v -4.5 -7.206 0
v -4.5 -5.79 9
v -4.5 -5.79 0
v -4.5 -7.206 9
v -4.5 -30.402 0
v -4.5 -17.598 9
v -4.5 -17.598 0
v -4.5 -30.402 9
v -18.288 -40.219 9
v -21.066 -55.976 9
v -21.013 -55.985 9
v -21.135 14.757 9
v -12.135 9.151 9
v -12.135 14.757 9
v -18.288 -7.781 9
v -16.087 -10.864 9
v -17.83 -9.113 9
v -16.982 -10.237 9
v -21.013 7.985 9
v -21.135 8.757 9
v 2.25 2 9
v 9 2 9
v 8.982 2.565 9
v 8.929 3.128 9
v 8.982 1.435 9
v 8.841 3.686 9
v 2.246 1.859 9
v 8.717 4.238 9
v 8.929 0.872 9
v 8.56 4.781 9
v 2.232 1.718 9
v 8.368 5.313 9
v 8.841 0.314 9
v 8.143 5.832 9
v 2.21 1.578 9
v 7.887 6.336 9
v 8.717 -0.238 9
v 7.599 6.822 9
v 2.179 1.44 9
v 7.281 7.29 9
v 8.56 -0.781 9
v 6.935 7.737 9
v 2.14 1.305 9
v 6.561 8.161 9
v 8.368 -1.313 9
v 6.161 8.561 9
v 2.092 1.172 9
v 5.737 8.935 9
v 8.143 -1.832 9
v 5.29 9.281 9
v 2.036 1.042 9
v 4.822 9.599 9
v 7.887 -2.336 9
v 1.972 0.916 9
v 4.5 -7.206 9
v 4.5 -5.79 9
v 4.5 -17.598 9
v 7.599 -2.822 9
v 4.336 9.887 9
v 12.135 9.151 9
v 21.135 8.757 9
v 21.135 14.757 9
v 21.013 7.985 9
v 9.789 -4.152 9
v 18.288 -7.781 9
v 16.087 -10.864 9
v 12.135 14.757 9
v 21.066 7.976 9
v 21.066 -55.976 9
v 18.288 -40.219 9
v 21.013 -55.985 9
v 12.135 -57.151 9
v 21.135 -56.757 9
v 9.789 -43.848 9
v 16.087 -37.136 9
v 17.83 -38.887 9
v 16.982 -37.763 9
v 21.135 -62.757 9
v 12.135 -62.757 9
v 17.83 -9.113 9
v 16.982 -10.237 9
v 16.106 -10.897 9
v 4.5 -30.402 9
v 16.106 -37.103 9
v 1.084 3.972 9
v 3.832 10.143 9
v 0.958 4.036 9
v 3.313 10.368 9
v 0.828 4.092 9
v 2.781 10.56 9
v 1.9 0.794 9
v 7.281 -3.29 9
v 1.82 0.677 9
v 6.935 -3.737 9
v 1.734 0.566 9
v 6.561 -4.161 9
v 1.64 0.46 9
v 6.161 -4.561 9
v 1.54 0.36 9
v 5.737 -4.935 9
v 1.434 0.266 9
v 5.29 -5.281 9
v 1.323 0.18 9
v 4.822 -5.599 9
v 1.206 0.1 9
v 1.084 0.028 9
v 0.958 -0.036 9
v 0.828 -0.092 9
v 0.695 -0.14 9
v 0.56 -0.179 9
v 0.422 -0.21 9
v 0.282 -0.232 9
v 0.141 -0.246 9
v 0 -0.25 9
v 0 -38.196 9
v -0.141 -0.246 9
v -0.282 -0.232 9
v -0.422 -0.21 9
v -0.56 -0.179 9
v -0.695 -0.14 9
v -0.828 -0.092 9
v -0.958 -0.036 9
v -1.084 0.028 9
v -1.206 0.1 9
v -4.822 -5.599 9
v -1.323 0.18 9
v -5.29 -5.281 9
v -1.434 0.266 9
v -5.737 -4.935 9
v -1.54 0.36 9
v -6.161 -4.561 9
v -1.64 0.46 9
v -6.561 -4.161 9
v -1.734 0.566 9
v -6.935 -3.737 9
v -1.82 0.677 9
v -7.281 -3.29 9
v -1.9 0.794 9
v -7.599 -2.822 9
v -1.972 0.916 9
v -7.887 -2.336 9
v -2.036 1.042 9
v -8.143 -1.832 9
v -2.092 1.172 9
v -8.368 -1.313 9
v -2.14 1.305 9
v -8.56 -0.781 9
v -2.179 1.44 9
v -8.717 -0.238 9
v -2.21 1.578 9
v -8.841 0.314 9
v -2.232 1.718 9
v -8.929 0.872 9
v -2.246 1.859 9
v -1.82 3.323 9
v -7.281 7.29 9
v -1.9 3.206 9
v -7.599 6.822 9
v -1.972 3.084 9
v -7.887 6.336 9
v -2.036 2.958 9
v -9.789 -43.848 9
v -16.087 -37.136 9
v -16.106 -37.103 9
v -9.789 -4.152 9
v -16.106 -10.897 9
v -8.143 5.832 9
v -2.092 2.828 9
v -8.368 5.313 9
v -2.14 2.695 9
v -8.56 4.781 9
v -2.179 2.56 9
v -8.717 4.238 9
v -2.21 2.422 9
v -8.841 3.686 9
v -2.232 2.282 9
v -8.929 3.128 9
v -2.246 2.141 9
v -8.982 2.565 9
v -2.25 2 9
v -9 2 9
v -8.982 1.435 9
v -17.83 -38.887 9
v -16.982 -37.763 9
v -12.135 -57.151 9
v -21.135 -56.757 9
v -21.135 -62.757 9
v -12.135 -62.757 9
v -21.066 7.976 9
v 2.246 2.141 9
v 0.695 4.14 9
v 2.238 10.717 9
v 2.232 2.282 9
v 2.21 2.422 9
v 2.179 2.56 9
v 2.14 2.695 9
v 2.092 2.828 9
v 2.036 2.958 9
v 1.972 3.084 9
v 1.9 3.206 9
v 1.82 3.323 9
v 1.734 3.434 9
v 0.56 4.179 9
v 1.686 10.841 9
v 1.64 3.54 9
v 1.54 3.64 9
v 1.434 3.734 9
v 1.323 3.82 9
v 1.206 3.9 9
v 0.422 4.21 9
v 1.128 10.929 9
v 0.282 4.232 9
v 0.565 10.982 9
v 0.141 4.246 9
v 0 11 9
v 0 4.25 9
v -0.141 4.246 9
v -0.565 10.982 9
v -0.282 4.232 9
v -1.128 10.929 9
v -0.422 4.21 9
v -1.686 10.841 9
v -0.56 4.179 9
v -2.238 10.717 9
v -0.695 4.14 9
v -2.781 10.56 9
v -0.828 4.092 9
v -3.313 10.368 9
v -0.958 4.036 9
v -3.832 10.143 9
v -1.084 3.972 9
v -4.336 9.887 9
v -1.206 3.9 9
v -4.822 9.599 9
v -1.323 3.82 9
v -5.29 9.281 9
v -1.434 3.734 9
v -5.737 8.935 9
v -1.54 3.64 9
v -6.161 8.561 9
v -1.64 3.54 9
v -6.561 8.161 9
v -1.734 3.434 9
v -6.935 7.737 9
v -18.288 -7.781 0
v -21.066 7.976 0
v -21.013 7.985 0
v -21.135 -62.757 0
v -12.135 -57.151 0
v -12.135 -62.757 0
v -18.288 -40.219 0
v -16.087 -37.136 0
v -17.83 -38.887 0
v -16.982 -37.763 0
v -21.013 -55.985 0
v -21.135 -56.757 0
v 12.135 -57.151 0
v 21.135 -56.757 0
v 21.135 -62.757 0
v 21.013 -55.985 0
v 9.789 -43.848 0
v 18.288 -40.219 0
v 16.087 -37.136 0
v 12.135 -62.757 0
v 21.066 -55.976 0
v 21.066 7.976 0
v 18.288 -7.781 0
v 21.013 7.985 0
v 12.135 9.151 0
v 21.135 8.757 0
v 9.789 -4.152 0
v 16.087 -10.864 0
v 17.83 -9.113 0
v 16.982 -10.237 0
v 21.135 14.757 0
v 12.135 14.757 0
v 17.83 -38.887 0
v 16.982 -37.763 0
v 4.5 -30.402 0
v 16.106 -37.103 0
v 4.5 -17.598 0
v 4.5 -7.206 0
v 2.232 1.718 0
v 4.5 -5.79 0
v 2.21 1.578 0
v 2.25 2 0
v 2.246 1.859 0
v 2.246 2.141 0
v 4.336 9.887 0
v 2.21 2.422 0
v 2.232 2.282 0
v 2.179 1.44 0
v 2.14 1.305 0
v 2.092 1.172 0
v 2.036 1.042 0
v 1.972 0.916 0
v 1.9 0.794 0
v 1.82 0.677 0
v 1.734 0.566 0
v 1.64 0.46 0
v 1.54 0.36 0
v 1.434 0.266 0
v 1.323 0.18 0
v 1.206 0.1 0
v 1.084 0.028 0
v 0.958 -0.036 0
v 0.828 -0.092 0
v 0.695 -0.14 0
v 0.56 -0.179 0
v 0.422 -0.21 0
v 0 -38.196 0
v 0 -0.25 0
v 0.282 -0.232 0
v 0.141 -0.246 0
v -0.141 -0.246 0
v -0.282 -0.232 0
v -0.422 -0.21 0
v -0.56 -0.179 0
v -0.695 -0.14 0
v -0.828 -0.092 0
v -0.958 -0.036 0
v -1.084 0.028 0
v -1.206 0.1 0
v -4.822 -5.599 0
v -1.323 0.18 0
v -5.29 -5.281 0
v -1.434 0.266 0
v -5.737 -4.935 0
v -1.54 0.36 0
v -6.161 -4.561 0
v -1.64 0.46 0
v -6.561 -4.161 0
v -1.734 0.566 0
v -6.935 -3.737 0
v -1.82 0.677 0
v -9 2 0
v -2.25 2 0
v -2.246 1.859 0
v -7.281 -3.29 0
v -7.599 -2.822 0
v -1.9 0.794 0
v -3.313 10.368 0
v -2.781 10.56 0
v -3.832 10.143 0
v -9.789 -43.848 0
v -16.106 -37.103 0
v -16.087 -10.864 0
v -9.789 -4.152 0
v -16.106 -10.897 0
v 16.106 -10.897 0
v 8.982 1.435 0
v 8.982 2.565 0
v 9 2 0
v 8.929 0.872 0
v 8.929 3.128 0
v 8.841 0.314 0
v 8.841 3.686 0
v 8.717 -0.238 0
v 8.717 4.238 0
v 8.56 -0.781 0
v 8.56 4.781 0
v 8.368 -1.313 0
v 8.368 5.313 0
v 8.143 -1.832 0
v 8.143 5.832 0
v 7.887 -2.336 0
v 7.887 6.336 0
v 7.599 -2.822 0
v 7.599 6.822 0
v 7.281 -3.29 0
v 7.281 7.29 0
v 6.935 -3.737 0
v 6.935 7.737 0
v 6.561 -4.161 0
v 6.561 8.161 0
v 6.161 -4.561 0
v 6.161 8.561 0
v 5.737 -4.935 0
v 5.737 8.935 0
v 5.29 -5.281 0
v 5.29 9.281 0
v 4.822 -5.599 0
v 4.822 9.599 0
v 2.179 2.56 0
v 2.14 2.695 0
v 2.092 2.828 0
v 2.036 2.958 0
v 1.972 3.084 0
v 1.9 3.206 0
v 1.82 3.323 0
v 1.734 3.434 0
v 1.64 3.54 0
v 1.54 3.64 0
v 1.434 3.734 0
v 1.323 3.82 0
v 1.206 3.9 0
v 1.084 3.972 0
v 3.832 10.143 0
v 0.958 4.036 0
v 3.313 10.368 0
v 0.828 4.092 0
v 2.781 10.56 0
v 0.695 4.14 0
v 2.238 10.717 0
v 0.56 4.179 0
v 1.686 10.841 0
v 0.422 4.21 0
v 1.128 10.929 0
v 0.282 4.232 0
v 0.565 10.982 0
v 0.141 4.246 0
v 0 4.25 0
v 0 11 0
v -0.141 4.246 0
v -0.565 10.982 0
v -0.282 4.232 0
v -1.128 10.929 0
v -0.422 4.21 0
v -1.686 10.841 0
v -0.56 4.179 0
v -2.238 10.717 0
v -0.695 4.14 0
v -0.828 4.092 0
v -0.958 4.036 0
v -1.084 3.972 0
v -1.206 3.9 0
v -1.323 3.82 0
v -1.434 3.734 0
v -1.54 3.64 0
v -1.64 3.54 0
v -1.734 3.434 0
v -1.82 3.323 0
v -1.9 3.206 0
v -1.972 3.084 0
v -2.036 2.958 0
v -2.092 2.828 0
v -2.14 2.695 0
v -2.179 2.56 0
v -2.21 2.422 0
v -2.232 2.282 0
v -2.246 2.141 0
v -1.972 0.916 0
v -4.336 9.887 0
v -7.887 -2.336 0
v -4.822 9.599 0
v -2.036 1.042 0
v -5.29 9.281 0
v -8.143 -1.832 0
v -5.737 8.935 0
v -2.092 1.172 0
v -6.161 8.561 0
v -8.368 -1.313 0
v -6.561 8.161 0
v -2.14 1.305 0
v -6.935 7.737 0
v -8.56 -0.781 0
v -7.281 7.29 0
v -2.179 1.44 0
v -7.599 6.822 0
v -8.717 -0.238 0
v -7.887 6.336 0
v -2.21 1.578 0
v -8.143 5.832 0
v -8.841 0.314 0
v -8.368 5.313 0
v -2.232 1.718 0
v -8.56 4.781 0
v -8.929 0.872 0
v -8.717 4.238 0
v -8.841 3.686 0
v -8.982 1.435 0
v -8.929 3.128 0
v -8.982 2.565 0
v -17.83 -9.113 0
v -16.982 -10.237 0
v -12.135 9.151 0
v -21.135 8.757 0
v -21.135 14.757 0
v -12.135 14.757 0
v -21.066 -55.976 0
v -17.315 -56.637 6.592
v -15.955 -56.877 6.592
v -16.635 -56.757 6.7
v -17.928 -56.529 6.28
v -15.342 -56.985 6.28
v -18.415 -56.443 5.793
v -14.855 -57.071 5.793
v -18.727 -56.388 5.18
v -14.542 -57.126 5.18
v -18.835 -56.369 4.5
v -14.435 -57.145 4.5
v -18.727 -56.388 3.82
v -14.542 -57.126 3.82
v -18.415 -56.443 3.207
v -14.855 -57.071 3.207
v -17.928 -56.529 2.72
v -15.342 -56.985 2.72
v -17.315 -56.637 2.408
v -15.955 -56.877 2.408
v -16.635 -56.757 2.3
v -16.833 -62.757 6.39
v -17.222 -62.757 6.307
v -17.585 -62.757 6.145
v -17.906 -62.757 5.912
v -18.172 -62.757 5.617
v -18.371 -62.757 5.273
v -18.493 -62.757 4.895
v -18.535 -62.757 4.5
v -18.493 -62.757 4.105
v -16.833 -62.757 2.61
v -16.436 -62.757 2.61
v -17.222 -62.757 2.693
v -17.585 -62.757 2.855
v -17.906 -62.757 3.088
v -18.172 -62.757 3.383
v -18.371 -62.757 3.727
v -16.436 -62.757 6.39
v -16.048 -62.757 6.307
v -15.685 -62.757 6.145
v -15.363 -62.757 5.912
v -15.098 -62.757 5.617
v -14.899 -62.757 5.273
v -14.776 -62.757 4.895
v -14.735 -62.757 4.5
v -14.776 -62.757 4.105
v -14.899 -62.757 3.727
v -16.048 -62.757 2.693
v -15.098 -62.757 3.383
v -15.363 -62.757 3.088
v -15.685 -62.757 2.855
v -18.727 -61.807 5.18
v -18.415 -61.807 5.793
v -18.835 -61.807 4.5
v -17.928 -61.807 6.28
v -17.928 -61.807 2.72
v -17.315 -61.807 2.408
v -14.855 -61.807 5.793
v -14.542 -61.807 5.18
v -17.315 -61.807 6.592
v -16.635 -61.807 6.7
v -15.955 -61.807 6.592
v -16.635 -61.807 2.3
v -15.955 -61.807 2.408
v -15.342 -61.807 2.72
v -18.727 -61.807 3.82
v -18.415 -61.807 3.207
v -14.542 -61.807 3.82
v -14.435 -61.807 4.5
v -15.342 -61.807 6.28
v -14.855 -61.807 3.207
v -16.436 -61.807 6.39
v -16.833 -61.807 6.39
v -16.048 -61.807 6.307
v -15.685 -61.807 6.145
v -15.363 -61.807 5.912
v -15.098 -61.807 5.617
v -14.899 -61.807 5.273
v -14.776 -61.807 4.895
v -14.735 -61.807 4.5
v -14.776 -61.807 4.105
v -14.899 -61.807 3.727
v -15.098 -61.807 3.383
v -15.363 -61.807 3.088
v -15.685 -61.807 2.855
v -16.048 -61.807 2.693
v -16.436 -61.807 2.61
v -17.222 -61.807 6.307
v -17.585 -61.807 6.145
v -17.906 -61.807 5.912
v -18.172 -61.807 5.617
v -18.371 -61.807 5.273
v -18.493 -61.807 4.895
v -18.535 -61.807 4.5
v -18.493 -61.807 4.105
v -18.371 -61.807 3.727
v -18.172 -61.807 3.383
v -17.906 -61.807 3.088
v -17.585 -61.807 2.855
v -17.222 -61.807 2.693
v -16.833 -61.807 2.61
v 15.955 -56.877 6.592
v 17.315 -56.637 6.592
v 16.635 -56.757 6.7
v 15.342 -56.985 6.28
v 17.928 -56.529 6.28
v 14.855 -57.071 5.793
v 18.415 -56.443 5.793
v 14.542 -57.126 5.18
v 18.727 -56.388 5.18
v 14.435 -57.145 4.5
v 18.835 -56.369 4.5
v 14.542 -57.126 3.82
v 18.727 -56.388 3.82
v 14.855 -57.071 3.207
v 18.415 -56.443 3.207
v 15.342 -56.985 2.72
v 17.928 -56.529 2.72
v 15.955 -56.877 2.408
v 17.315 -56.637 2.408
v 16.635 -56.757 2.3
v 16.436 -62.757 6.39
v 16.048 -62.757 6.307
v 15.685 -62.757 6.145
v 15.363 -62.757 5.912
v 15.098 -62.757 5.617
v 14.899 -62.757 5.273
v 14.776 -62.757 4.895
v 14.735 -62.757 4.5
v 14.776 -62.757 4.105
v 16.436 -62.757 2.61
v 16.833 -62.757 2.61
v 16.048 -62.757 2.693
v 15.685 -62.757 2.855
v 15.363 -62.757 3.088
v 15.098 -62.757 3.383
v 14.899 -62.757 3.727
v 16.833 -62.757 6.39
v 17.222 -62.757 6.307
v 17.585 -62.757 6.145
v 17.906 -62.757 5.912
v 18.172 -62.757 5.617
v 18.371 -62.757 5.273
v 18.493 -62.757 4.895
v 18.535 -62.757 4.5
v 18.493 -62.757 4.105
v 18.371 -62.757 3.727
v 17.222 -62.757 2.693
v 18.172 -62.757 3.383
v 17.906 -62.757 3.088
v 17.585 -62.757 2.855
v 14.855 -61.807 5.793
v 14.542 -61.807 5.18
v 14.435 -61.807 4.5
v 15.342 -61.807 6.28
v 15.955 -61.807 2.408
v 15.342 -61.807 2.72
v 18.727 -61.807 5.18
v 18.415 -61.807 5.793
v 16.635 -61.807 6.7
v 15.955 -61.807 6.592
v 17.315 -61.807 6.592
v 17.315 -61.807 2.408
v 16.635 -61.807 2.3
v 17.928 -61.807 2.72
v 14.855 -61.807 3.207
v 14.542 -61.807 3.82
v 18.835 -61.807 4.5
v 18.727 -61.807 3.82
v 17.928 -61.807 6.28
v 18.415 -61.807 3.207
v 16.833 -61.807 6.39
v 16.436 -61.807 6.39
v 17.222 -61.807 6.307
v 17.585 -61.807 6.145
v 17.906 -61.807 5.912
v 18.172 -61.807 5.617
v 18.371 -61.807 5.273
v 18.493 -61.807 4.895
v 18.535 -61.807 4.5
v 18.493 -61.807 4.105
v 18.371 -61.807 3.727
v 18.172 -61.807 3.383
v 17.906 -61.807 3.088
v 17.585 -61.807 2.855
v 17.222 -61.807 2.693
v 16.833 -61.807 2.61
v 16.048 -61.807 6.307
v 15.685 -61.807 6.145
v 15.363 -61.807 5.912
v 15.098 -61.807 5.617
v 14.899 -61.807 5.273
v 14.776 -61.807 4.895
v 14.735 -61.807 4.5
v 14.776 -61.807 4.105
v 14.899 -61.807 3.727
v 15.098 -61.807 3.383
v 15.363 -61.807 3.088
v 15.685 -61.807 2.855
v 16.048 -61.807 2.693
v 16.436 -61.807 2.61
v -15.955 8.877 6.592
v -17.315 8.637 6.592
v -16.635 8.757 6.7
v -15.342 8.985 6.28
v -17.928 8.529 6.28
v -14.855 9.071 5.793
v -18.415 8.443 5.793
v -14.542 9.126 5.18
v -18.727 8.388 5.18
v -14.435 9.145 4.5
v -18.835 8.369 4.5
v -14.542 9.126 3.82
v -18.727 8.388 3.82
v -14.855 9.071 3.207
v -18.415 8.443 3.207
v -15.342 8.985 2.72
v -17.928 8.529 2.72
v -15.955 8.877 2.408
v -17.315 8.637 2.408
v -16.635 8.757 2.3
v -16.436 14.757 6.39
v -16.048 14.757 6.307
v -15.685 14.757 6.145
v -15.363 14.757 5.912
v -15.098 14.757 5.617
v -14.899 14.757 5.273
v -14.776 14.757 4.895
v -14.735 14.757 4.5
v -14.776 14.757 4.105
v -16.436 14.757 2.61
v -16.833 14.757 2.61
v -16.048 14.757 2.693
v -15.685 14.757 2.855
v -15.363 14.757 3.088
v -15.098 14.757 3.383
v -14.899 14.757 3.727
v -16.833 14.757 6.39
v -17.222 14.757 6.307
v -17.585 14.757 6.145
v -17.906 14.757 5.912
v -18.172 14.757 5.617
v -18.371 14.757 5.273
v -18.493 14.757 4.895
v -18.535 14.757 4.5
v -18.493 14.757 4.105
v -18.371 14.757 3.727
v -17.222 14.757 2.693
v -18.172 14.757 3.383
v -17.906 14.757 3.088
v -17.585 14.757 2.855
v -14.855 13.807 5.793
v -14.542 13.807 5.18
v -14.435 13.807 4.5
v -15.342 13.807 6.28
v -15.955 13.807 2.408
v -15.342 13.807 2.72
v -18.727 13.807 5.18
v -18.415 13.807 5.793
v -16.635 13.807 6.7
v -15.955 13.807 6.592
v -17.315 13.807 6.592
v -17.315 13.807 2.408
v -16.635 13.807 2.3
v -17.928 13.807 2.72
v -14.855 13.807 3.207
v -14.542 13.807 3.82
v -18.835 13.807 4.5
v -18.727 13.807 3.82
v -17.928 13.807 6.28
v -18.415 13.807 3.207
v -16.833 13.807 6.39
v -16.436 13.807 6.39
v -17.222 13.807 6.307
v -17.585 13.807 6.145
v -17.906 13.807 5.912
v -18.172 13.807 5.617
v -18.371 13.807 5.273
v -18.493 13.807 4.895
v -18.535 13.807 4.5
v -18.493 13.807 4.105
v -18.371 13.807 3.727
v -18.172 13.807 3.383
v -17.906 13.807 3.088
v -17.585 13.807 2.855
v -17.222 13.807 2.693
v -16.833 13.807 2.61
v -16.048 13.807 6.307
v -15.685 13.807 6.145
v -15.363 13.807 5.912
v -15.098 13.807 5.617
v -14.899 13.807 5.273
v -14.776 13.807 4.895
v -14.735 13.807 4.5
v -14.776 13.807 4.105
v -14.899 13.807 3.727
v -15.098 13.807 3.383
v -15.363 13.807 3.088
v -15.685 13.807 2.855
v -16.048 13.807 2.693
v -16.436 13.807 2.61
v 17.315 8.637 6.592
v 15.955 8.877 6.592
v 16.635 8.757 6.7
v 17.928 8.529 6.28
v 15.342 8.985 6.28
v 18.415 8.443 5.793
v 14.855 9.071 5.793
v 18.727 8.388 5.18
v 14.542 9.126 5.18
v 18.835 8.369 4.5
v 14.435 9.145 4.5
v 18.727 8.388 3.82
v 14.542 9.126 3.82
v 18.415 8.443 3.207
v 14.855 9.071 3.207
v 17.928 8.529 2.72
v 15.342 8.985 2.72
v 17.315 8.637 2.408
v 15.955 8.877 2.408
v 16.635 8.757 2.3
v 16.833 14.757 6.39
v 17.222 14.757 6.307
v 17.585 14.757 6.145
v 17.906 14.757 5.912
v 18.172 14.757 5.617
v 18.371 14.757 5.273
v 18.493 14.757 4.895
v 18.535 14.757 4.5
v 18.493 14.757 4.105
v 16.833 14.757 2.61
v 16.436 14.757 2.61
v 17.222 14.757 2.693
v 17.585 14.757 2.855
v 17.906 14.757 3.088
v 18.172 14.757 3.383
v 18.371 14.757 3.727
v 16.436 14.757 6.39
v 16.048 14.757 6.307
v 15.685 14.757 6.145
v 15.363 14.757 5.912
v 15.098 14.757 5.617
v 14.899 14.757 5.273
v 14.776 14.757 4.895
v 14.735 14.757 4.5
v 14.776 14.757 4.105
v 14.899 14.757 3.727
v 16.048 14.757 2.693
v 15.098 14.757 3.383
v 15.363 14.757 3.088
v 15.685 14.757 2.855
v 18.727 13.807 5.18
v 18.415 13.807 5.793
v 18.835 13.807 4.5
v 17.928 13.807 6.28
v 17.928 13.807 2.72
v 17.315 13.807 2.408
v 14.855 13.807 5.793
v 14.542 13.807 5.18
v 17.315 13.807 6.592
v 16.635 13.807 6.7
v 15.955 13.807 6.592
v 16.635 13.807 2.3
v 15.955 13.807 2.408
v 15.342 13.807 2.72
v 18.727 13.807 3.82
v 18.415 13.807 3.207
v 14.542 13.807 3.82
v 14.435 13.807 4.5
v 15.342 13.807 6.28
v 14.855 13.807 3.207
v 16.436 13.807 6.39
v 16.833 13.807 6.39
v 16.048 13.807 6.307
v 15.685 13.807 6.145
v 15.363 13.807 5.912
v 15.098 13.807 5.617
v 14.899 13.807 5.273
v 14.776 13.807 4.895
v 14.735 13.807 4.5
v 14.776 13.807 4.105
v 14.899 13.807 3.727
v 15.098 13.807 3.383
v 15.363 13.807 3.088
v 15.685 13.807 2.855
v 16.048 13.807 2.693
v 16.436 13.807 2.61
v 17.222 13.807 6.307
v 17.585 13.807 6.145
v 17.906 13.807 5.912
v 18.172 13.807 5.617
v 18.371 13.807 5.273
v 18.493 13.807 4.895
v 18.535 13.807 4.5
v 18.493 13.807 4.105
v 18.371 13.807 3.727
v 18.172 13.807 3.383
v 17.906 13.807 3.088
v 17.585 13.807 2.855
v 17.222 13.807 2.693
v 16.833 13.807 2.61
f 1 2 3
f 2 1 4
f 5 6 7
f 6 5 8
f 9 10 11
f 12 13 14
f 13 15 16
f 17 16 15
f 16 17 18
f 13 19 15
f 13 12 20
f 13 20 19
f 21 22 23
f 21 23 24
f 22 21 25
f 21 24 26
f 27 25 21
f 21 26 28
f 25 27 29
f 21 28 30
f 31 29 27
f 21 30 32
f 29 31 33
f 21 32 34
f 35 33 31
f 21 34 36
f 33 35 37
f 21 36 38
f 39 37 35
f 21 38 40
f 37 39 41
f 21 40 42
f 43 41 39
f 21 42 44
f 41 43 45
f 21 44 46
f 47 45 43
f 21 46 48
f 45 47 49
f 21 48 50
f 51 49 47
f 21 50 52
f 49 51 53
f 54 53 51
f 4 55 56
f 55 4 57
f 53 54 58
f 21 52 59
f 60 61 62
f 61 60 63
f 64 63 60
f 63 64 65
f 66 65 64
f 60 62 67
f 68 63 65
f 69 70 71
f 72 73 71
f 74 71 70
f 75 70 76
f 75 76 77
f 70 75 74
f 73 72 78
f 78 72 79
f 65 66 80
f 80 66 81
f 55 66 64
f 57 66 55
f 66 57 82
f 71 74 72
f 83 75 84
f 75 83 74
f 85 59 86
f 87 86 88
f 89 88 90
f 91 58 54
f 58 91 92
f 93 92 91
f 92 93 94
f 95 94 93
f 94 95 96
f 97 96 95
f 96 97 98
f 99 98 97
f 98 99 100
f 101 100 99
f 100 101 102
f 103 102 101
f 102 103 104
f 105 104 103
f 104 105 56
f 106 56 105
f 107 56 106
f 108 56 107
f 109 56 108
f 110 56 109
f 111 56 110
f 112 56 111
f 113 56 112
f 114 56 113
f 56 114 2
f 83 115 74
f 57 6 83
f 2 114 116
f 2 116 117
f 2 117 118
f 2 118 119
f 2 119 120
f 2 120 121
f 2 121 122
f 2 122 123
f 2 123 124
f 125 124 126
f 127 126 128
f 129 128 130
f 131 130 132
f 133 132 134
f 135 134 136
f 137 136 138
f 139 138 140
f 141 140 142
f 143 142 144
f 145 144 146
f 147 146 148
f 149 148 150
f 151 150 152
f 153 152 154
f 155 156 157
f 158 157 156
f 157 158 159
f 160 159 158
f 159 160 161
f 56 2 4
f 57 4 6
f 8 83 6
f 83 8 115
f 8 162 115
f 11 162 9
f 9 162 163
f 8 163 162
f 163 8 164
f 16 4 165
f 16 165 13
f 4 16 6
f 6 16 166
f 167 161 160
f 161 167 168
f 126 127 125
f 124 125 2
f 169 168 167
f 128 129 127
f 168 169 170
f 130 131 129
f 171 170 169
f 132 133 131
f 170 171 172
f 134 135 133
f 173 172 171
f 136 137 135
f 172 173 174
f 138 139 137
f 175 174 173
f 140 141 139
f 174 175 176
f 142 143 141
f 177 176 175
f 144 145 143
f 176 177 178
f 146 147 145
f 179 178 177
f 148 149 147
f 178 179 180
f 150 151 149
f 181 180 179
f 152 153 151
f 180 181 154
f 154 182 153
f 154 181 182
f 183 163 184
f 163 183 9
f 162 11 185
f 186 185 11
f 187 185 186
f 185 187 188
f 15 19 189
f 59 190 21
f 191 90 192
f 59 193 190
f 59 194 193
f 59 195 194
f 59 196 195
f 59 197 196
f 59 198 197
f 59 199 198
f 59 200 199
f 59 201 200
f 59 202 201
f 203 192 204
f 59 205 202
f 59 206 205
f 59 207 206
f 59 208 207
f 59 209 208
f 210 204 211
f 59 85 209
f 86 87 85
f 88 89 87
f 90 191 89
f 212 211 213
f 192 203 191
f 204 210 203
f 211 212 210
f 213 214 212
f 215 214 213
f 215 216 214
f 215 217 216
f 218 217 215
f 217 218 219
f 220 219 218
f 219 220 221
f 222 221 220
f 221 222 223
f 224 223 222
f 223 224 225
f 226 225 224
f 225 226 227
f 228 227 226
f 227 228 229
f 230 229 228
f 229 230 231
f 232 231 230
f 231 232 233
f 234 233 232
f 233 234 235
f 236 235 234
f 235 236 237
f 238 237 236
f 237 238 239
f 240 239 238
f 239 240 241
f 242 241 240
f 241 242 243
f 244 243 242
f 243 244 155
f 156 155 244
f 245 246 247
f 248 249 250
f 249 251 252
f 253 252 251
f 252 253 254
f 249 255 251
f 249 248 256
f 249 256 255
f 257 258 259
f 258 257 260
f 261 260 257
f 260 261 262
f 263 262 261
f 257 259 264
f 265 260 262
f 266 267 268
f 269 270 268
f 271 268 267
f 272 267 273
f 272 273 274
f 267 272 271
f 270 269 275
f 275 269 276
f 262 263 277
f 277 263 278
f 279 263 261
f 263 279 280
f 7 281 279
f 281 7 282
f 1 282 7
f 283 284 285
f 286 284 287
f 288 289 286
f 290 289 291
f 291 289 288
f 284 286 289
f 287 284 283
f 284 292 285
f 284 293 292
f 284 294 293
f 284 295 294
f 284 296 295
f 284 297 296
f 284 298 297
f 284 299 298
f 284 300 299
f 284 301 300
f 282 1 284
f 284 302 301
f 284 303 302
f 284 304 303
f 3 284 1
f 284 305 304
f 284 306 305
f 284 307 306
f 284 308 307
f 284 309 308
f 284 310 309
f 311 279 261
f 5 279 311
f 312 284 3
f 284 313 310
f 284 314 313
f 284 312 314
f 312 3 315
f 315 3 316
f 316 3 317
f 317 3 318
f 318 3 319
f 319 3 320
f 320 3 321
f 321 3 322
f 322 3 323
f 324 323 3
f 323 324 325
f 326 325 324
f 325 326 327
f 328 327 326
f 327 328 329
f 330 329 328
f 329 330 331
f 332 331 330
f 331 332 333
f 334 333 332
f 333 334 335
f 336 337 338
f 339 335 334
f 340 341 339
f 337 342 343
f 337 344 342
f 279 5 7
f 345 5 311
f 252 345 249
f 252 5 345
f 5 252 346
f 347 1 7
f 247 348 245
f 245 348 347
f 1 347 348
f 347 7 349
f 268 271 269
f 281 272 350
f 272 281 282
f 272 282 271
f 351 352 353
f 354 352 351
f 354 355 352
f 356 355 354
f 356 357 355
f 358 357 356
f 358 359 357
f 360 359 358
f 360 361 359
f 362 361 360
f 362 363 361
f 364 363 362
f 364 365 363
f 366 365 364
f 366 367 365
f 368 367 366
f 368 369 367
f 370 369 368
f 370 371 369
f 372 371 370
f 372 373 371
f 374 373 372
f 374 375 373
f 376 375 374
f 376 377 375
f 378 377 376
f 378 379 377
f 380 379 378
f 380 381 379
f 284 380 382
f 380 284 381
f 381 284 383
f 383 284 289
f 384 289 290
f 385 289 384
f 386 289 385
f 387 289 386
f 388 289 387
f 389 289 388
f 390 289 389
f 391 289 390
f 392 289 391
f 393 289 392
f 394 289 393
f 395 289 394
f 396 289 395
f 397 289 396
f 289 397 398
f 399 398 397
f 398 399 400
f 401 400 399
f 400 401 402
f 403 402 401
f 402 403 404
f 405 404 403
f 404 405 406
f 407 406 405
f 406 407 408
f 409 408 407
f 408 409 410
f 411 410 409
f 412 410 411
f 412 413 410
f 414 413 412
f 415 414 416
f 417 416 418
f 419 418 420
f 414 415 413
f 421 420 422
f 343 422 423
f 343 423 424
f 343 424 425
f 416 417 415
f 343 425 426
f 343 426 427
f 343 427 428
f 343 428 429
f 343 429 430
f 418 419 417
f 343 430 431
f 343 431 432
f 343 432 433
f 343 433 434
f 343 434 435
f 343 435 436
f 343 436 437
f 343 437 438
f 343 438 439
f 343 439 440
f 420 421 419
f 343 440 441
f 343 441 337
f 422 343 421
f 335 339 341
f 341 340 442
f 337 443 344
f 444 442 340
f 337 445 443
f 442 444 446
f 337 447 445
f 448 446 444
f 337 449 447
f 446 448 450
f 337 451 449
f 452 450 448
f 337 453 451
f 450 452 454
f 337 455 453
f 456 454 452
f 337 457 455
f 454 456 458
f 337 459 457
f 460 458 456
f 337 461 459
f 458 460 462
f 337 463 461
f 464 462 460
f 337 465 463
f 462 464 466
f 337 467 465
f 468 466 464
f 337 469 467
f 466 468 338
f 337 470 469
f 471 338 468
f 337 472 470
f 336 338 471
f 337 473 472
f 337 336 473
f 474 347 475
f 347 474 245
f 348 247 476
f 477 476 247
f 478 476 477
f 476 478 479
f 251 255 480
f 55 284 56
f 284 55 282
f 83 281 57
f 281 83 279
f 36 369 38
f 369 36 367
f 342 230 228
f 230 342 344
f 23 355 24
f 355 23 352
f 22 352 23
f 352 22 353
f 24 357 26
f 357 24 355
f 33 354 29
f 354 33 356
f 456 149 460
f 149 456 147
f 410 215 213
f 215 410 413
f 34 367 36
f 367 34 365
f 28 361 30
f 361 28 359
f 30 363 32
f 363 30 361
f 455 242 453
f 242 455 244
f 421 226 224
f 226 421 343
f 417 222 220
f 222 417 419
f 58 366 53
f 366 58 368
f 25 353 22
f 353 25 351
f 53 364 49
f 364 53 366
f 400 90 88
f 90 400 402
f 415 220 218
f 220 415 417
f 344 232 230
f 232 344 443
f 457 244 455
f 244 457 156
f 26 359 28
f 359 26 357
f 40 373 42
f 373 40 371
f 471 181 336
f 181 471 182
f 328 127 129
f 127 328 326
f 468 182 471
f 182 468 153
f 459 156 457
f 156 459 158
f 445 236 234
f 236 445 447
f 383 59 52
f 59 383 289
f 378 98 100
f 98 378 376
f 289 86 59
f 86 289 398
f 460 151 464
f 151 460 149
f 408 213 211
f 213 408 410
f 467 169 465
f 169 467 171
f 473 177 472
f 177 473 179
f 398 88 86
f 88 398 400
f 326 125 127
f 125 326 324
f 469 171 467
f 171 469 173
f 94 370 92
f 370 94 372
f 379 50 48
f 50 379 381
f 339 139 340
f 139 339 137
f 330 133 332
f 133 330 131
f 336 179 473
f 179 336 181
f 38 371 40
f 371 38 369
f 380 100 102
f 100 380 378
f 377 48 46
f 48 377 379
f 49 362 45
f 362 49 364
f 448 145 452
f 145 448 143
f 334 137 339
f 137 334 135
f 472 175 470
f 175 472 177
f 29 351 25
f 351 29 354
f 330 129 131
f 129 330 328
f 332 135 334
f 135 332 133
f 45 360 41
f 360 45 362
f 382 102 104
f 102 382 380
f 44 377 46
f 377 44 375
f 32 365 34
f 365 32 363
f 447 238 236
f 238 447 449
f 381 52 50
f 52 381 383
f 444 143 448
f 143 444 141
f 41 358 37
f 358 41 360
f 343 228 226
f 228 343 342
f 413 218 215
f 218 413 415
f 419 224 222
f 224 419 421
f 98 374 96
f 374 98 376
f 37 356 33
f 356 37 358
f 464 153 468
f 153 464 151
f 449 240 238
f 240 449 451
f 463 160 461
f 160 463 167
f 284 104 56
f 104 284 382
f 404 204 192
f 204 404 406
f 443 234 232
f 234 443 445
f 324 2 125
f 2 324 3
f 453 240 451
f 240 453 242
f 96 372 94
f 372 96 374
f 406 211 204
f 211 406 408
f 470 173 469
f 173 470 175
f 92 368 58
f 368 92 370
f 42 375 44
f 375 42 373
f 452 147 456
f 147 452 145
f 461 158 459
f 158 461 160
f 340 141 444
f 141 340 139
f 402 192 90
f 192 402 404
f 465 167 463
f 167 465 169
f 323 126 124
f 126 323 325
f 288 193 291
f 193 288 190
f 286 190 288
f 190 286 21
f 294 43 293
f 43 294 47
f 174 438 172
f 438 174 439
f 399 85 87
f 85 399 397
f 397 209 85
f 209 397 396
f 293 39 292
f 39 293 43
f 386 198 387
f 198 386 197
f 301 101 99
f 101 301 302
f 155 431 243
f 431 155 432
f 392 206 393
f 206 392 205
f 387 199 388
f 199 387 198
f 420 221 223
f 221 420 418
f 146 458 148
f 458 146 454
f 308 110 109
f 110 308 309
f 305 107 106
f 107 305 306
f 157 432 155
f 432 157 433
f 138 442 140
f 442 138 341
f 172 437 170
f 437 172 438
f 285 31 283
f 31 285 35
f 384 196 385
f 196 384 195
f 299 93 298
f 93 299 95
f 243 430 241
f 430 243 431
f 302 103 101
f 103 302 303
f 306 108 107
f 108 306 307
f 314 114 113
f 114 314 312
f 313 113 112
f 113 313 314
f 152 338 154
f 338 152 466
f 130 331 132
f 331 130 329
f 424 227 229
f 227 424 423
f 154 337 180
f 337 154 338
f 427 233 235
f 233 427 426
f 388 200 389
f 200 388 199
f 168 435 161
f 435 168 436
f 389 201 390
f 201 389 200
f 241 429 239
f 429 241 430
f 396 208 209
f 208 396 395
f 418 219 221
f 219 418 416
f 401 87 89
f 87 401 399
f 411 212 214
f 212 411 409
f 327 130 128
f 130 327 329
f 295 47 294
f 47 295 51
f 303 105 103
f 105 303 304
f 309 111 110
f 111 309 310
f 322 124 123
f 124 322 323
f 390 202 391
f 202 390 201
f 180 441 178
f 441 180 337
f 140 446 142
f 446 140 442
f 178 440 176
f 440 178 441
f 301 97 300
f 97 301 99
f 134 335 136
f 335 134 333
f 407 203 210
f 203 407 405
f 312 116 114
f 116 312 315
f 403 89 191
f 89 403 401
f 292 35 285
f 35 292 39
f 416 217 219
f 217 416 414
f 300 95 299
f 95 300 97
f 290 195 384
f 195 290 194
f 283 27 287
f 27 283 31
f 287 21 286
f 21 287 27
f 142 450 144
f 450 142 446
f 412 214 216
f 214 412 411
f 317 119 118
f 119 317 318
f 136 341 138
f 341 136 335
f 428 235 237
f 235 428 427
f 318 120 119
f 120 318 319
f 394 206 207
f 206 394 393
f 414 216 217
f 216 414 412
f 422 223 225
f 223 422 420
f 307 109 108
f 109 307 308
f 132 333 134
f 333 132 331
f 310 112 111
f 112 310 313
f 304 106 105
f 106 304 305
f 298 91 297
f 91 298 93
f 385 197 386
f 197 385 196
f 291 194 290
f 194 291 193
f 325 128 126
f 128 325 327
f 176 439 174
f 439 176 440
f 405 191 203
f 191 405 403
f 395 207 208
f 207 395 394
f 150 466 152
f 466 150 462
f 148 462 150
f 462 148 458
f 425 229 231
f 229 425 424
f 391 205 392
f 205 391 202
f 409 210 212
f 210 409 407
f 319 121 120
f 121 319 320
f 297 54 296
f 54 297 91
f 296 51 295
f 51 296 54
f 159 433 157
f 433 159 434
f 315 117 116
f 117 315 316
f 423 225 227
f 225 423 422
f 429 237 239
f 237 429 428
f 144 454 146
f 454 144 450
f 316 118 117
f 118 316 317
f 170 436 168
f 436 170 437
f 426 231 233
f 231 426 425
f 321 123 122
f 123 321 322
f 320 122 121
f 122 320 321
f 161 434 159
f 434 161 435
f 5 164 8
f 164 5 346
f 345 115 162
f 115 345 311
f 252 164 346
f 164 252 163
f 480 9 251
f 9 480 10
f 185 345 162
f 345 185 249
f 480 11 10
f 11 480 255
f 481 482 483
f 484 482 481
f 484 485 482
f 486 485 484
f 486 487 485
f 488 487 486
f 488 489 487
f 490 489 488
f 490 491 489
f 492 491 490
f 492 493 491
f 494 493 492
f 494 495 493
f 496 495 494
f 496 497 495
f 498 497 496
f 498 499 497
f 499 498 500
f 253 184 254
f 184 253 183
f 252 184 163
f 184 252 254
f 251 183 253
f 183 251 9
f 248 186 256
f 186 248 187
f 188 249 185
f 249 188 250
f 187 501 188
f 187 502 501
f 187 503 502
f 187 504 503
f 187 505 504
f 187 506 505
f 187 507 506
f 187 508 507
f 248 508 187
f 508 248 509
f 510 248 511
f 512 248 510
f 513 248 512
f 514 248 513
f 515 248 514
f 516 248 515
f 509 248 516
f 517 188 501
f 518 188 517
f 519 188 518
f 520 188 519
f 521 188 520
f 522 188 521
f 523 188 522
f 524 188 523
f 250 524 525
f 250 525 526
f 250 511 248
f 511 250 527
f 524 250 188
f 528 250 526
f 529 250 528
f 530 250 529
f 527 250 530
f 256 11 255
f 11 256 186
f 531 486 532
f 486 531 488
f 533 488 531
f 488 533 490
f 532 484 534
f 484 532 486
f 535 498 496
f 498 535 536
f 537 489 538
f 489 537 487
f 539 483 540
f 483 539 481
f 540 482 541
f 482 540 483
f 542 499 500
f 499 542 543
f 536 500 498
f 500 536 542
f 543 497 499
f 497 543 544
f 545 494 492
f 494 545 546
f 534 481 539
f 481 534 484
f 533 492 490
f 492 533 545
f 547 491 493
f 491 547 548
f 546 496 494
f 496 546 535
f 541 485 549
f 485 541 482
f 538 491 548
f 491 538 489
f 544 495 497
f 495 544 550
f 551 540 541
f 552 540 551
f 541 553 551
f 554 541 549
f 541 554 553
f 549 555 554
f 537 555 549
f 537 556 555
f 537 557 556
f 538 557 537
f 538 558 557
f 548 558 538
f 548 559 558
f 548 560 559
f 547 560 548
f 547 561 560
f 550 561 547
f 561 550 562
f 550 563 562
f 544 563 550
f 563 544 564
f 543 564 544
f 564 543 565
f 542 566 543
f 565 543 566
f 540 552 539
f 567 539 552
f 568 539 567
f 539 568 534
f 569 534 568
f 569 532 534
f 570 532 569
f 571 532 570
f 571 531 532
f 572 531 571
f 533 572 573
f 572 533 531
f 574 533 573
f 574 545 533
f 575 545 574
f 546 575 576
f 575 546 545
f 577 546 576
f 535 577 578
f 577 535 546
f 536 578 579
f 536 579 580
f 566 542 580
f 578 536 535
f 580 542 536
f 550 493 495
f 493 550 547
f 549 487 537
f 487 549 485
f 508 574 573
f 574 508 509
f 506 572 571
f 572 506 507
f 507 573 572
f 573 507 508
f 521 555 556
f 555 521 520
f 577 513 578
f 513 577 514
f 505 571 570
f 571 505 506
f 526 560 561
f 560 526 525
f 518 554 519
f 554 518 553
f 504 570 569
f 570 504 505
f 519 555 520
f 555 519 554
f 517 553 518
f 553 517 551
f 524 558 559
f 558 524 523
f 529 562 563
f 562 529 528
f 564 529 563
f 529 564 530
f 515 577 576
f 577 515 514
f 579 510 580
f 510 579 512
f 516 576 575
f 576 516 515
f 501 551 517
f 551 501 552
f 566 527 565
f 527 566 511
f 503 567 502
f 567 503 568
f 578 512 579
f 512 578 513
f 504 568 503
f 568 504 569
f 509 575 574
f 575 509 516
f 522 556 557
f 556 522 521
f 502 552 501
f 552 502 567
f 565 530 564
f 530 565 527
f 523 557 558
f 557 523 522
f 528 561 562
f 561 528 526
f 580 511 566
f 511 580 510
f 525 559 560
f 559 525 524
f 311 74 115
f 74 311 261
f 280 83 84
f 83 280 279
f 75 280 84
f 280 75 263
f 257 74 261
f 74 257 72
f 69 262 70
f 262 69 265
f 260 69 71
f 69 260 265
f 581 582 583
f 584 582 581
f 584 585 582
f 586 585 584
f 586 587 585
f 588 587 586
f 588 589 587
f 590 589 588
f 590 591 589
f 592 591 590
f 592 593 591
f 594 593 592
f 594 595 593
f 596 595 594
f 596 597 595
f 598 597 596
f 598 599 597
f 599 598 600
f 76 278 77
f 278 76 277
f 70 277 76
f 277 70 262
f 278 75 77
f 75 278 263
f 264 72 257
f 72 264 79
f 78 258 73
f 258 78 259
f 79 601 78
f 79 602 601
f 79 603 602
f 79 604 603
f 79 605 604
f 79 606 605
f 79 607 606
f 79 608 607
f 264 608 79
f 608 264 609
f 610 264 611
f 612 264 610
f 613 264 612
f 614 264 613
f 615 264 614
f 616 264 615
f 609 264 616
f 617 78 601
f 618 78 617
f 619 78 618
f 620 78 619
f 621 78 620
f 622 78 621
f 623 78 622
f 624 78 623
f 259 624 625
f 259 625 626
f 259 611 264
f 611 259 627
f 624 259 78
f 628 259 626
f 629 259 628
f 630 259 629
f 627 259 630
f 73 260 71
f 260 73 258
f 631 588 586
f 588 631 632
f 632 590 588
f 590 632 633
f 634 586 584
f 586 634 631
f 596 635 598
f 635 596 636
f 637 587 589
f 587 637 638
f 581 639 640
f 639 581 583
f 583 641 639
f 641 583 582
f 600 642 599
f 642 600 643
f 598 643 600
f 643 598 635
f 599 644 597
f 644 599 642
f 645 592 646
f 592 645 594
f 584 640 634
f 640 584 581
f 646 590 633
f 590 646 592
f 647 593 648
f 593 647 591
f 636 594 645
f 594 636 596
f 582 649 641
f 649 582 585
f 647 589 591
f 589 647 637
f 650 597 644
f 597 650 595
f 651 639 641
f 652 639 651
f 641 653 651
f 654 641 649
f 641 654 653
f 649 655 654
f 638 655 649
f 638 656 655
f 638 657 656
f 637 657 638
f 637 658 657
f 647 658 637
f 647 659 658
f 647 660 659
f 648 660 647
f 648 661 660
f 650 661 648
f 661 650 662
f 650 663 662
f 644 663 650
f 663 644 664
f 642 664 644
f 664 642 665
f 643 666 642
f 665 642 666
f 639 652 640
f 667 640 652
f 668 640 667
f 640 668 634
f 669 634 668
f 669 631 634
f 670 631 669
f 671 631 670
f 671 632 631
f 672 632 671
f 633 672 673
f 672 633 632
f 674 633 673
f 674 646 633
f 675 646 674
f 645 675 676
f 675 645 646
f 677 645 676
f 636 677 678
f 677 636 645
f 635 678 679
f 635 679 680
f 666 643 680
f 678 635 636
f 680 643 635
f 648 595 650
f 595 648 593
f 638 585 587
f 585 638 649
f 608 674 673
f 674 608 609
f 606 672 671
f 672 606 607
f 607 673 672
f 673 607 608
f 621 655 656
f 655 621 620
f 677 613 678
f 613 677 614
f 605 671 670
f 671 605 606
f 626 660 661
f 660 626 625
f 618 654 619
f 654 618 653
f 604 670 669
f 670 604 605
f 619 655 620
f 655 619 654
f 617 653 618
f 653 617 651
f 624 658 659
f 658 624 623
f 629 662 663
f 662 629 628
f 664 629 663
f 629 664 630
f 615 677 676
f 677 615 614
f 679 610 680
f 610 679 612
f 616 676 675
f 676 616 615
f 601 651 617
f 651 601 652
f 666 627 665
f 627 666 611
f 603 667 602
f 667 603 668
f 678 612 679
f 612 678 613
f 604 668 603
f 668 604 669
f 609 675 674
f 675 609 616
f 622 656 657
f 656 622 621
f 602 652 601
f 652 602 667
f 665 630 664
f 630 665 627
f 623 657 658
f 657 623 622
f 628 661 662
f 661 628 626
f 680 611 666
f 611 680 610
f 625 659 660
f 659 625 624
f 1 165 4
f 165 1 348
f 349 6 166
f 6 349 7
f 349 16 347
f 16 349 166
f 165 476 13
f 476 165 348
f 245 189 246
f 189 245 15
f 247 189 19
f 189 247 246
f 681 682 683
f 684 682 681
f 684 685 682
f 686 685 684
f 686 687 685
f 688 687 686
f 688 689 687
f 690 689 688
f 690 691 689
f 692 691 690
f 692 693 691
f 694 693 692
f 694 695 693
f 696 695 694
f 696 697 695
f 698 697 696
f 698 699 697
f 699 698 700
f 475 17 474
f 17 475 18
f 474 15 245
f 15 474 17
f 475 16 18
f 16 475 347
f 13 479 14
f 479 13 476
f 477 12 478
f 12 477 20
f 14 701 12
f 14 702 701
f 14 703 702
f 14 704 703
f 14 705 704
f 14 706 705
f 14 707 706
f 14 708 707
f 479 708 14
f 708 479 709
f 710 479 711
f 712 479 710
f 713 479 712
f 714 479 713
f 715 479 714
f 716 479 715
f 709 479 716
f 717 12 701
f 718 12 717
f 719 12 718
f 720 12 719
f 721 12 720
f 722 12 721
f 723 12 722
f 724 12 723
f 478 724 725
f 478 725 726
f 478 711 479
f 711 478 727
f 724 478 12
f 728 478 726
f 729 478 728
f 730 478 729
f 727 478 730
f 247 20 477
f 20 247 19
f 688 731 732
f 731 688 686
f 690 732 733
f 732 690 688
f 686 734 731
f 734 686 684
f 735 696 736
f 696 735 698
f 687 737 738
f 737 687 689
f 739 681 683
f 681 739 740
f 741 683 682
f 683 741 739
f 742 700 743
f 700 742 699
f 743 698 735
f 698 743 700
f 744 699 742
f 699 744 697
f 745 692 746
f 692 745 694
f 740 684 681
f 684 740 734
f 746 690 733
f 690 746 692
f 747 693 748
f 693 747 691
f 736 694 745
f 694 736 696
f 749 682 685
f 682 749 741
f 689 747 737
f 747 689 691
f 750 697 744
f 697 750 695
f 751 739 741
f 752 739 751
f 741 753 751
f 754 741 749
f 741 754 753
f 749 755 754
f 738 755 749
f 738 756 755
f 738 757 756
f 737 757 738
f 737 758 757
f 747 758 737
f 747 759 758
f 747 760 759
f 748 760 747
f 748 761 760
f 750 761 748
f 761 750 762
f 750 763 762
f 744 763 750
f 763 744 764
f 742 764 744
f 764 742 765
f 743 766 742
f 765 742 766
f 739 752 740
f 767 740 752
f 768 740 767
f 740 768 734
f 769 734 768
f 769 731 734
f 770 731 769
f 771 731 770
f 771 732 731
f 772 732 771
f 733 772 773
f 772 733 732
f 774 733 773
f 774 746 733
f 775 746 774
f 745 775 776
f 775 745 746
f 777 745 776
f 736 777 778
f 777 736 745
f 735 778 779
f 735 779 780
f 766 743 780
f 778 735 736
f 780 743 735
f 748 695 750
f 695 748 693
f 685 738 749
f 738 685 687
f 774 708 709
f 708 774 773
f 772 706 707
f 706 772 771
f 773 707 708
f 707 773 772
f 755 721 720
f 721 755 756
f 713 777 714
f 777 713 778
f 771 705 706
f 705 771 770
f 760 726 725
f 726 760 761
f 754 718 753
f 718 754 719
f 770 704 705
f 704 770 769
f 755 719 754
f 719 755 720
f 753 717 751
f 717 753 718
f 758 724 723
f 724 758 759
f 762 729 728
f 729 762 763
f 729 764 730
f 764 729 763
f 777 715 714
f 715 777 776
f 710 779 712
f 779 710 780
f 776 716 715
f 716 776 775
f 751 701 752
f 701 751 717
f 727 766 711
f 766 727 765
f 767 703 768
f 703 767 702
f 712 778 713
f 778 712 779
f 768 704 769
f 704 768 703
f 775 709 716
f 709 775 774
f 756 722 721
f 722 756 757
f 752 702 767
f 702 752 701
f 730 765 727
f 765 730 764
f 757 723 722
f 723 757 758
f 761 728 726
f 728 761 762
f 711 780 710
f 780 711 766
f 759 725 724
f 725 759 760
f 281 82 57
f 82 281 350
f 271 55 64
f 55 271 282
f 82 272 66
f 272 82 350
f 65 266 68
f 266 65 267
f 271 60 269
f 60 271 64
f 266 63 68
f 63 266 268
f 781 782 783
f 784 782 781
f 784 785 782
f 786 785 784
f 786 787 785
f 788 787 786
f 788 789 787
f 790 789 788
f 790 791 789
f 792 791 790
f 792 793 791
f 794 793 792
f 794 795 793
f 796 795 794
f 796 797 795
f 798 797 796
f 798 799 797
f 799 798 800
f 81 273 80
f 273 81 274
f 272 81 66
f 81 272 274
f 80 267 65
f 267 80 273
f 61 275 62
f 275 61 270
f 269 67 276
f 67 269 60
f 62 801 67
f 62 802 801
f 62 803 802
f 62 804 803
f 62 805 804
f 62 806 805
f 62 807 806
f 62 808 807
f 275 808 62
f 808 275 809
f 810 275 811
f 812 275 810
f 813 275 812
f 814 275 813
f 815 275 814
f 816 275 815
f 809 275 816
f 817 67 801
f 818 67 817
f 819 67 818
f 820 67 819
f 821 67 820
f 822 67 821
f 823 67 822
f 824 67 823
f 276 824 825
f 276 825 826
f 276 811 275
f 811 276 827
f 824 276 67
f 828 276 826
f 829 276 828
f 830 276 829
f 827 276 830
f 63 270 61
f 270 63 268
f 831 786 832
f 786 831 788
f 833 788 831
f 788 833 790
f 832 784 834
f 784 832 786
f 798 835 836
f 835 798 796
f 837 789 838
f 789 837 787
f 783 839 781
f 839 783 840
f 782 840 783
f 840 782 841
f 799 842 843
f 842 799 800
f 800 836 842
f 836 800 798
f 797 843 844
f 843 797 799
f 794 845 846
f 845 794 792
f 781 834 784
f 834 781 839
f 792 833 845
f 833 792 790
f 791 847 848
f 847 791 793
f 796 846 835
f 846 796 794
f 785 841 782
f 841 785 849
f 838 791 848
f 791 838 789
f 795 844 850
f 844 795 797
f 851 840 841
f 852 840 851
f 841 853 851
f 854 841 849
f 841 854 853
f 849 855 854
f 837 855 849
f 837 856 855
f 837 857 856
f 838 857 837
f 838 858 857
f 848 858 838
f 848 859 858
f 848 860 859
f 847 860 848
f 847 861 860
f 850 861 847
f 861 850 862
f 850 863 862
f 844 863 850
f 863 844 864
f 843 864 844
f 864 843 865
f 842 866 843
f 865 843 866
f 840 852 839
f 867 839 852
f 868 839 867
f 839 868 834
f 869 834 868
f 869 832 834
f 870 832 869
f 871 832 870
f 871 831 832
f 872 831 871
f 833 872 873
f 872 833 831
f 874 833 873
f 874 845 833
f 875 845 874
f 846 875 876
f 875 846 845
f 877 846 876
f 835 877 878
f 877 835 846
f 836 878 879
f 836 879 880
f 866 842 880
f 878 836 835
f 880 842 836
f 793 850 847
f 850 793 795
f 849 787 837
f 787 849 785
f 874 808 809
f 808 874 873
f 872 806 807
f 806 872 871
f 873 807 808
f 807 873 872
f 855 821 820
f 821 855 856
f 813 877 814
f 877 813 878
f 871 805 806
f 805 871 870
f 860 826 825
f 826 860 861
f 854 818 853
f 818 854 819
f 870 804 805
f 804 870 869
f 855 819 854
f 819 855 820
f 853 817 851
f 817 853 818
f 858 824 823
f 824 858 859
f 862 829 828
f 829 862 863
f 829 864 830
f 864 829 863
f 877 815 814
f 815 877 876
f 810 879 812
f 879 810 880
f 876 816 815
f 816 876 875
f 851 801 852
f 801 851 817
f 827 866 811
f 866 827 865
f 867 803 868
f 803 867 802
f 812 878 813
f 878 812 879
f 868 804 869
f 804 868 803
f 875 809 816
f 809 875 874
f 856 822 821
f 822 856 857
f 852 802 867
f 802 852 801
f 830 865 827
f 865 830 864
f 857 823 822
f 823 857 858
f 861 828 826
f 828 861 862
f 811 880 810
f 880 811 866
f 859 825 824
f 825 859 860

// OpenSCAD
// ==================================================
// Stick Man - Customizer
// Created by Daiju Watanbe ( Daizyu ).
// 2 April 2016. 
// =================================================

/* MODIFIED VERSION BY Daniel K. Schneider
   January 2017
   - removed base
   - changed default parameters
   - added holes in feet and hands to insert 5x5mm cylindrical magnets
   
   Tips: 
   - The sum of each arm or foot limb angles should be 180.
   - Magnet diameter should be a bit smaller than the magnet if printed with TPE
   - magnet_entry_extra_width = -0.6; and magnet_entry_extra_height = 1; // add a bottle neck
   - Set the magnet_entry_extra_* values to zero if you plan to glue the magnet.
*/

// preview[view:south, tilt:top]

/* [Angle] */
upper_arm_l = -120;               // [-360:360]
lower_arm_l = -50;               // [-360:360]
hand_l = -10;               // [-360:360]
upper_arm_r = 120;               // [-360:360]
lower_arm_r = 50;               // [-360:360]
hand_r = 10;               // [-360:360]
thigh_l = -60;               // [-360:360]
shin_l = 50;               // [-360:360]
foot_l = 10;               // [-360:360]
thigh_r = 60;               // [-360:360]
shin_r = -50;               // [-360:360]
foot_r = -10;               // [-360:360]
body = 0;               // [-360:360]

/* [Basic] */
b_thickness = 9;
thickness = 9;

/* [Magnet holes] */
magnet_diameter = 4.4;
magnet_entry_extra_width = -0.6; // [-1:0]
magnet_entry_extra_height = 1; // [0:1]
magnet_height = 5; // [1:5]

/* [Head] */
fill_head = false;
head_diameter = 18;
head_offset_x = 0;
head_offset_y = 2;
head_hole_diameter = 4.5;

/* [Body] */
body_length = 24;

/* [Heart] */
heart_diameter = 0;
heart_offset_y = 0;

/* [Left arm] */
arm_l_offset = 6;
upper_arm_l_length = 16;
lower_arm_l_length = 16;
hand_l_length = 6;

/* [Right arm] */
arm_r_offset = 6;
upper_arm_r_length = 16;
lower_arm_r_length = 16;
hand_r_length = 6;

/* [Left Leg] */
thigh_l_length = 16;
shin_l_length = 16;
foot_l_length = 6;

/* [Right Leg] */
thigh_r_length = 16;
shin_r_length = 16;
foot_r_length = 6;

/* [Legs and hands] */
paw_extra_width = 0;
paw_extra_height = 0;

/* [resolution] */
base_fn = 120;
head_fn = 100;

module bone(length){
     {
	  translate([-thickness/2,0,0])
	       cube(size = [thickness,length,b_thickness], center = false);
     }
     cylinder(h=b_thickness, r=thickness/2, center=false ,$fn=20);
}

module handFootBone(length){
     {
	  difference () {
	       union () {
		    translate([-(thickness+paw_extra_width)/2,0,0])
			 cube(size = [thickness+paw_extra_width,length,b_thickness+paw_extra_width], center = false);
		    cylinder(h=b_thickness+paw_extra_width, r=(thickness+paw_extra_width)/2, center=false ,$fn=20);
	       }
	       // magnet hole
	       translate ([0,length-magnet_entry_extra_height+0.05,(b_thickness+paw_extra_width)/2])
		    rotate ([90,0,0])
		    cylinder(h=magnet_height+0.5, r=magnet_diameter/2, center=false ,$fn=20);
               // bottleneck at entry
	       translate ([0,length+0.05,(b_thickness+paw_extra_width)/2])
		    rotate ([90,0,0])
		    cylinder(h=magnet_entry_extra_height+0.05, r=(magnet_diameter + magnet_entry_extra_width)/2, center=false ,$fn=30);
	  }
     }
}

module branch(
     head_diameter,
     Degrees1,Length1,
     Degrees2,length2,
     Degrees3,length3,
     Degrees4,length4,
     )
{
     rotate(Degrees1,[0,0,1])
	  translate([0,Length1+head_diameter/2,0])
	  rotate(Degrees2,[0,0,1])
     {
	  bone(length2);

	  translate([0,length2,0])
	       rotate(Degrees3,[0,0,1])
	  {
	       bone(length3);

	       translate([0,length3,0])
		    rotate(Degrees4,[0,0,1])
	       {
		    handFootBone(length4);
	       }
	  }
     }
}

module headBody() {
     union(){
	  translate([head_offset_x,head_offset_y,0])
	       cylinder(h=b_thickness, r=head_diameter/2.0, center=false ,$fn=head_fn);
	  rotate(body+180,[0,0,1])
	       bone(body_length+head_diameter/2);	
     }
}



difference ()
{

     union()
     {
	  if ( fill_head ) 
	  {
	       headBody();
	  }else{
	       difference()
	       {
		    headBody();
		    translate([head_offset_x,head_offset_y,-1])
			 #cylinder(h=b_thickness+2, r=head_hole_diameter/2, center=false ,$fn=head_fn);
			 }
	  }
     
	  branch(head_diameter,
		 body+180,body_length,
		 thigh_l,thigh_l_length,
		 shin_l,shin_l_length,
		 foot_l,foot_l_length
	       );
     
	  branch(head_diameter,
		 body+180,body_length,
		 thigh_r,thigh_r_length,
		 shin_r,shin_r_length,
		 foot_r,foot_r_length
	       );

	  branch(head_diameter,
		 body+180,arm_l_offset,
		 upper_arm_l,upper_arm_l_length,
		 lower_arm_l,lower_arm_l_length,
		 hand_l,hand_l_length
	       );

	  branch(head_diameter,
		 body+180,arm_r_offset,
		 upper_arm_r,upper_arm_r_length,
		 lower_arm_r,lower_arm_r_length,
		 hand_r,hand_r_length
	       );
     }
     translate([0,-body_length/2-heart_offset_y,-1])
	  # cylinder(h=b_thickness+2, r=heart_diameter/2, center=false ,$fn=head_fn);
	  }
